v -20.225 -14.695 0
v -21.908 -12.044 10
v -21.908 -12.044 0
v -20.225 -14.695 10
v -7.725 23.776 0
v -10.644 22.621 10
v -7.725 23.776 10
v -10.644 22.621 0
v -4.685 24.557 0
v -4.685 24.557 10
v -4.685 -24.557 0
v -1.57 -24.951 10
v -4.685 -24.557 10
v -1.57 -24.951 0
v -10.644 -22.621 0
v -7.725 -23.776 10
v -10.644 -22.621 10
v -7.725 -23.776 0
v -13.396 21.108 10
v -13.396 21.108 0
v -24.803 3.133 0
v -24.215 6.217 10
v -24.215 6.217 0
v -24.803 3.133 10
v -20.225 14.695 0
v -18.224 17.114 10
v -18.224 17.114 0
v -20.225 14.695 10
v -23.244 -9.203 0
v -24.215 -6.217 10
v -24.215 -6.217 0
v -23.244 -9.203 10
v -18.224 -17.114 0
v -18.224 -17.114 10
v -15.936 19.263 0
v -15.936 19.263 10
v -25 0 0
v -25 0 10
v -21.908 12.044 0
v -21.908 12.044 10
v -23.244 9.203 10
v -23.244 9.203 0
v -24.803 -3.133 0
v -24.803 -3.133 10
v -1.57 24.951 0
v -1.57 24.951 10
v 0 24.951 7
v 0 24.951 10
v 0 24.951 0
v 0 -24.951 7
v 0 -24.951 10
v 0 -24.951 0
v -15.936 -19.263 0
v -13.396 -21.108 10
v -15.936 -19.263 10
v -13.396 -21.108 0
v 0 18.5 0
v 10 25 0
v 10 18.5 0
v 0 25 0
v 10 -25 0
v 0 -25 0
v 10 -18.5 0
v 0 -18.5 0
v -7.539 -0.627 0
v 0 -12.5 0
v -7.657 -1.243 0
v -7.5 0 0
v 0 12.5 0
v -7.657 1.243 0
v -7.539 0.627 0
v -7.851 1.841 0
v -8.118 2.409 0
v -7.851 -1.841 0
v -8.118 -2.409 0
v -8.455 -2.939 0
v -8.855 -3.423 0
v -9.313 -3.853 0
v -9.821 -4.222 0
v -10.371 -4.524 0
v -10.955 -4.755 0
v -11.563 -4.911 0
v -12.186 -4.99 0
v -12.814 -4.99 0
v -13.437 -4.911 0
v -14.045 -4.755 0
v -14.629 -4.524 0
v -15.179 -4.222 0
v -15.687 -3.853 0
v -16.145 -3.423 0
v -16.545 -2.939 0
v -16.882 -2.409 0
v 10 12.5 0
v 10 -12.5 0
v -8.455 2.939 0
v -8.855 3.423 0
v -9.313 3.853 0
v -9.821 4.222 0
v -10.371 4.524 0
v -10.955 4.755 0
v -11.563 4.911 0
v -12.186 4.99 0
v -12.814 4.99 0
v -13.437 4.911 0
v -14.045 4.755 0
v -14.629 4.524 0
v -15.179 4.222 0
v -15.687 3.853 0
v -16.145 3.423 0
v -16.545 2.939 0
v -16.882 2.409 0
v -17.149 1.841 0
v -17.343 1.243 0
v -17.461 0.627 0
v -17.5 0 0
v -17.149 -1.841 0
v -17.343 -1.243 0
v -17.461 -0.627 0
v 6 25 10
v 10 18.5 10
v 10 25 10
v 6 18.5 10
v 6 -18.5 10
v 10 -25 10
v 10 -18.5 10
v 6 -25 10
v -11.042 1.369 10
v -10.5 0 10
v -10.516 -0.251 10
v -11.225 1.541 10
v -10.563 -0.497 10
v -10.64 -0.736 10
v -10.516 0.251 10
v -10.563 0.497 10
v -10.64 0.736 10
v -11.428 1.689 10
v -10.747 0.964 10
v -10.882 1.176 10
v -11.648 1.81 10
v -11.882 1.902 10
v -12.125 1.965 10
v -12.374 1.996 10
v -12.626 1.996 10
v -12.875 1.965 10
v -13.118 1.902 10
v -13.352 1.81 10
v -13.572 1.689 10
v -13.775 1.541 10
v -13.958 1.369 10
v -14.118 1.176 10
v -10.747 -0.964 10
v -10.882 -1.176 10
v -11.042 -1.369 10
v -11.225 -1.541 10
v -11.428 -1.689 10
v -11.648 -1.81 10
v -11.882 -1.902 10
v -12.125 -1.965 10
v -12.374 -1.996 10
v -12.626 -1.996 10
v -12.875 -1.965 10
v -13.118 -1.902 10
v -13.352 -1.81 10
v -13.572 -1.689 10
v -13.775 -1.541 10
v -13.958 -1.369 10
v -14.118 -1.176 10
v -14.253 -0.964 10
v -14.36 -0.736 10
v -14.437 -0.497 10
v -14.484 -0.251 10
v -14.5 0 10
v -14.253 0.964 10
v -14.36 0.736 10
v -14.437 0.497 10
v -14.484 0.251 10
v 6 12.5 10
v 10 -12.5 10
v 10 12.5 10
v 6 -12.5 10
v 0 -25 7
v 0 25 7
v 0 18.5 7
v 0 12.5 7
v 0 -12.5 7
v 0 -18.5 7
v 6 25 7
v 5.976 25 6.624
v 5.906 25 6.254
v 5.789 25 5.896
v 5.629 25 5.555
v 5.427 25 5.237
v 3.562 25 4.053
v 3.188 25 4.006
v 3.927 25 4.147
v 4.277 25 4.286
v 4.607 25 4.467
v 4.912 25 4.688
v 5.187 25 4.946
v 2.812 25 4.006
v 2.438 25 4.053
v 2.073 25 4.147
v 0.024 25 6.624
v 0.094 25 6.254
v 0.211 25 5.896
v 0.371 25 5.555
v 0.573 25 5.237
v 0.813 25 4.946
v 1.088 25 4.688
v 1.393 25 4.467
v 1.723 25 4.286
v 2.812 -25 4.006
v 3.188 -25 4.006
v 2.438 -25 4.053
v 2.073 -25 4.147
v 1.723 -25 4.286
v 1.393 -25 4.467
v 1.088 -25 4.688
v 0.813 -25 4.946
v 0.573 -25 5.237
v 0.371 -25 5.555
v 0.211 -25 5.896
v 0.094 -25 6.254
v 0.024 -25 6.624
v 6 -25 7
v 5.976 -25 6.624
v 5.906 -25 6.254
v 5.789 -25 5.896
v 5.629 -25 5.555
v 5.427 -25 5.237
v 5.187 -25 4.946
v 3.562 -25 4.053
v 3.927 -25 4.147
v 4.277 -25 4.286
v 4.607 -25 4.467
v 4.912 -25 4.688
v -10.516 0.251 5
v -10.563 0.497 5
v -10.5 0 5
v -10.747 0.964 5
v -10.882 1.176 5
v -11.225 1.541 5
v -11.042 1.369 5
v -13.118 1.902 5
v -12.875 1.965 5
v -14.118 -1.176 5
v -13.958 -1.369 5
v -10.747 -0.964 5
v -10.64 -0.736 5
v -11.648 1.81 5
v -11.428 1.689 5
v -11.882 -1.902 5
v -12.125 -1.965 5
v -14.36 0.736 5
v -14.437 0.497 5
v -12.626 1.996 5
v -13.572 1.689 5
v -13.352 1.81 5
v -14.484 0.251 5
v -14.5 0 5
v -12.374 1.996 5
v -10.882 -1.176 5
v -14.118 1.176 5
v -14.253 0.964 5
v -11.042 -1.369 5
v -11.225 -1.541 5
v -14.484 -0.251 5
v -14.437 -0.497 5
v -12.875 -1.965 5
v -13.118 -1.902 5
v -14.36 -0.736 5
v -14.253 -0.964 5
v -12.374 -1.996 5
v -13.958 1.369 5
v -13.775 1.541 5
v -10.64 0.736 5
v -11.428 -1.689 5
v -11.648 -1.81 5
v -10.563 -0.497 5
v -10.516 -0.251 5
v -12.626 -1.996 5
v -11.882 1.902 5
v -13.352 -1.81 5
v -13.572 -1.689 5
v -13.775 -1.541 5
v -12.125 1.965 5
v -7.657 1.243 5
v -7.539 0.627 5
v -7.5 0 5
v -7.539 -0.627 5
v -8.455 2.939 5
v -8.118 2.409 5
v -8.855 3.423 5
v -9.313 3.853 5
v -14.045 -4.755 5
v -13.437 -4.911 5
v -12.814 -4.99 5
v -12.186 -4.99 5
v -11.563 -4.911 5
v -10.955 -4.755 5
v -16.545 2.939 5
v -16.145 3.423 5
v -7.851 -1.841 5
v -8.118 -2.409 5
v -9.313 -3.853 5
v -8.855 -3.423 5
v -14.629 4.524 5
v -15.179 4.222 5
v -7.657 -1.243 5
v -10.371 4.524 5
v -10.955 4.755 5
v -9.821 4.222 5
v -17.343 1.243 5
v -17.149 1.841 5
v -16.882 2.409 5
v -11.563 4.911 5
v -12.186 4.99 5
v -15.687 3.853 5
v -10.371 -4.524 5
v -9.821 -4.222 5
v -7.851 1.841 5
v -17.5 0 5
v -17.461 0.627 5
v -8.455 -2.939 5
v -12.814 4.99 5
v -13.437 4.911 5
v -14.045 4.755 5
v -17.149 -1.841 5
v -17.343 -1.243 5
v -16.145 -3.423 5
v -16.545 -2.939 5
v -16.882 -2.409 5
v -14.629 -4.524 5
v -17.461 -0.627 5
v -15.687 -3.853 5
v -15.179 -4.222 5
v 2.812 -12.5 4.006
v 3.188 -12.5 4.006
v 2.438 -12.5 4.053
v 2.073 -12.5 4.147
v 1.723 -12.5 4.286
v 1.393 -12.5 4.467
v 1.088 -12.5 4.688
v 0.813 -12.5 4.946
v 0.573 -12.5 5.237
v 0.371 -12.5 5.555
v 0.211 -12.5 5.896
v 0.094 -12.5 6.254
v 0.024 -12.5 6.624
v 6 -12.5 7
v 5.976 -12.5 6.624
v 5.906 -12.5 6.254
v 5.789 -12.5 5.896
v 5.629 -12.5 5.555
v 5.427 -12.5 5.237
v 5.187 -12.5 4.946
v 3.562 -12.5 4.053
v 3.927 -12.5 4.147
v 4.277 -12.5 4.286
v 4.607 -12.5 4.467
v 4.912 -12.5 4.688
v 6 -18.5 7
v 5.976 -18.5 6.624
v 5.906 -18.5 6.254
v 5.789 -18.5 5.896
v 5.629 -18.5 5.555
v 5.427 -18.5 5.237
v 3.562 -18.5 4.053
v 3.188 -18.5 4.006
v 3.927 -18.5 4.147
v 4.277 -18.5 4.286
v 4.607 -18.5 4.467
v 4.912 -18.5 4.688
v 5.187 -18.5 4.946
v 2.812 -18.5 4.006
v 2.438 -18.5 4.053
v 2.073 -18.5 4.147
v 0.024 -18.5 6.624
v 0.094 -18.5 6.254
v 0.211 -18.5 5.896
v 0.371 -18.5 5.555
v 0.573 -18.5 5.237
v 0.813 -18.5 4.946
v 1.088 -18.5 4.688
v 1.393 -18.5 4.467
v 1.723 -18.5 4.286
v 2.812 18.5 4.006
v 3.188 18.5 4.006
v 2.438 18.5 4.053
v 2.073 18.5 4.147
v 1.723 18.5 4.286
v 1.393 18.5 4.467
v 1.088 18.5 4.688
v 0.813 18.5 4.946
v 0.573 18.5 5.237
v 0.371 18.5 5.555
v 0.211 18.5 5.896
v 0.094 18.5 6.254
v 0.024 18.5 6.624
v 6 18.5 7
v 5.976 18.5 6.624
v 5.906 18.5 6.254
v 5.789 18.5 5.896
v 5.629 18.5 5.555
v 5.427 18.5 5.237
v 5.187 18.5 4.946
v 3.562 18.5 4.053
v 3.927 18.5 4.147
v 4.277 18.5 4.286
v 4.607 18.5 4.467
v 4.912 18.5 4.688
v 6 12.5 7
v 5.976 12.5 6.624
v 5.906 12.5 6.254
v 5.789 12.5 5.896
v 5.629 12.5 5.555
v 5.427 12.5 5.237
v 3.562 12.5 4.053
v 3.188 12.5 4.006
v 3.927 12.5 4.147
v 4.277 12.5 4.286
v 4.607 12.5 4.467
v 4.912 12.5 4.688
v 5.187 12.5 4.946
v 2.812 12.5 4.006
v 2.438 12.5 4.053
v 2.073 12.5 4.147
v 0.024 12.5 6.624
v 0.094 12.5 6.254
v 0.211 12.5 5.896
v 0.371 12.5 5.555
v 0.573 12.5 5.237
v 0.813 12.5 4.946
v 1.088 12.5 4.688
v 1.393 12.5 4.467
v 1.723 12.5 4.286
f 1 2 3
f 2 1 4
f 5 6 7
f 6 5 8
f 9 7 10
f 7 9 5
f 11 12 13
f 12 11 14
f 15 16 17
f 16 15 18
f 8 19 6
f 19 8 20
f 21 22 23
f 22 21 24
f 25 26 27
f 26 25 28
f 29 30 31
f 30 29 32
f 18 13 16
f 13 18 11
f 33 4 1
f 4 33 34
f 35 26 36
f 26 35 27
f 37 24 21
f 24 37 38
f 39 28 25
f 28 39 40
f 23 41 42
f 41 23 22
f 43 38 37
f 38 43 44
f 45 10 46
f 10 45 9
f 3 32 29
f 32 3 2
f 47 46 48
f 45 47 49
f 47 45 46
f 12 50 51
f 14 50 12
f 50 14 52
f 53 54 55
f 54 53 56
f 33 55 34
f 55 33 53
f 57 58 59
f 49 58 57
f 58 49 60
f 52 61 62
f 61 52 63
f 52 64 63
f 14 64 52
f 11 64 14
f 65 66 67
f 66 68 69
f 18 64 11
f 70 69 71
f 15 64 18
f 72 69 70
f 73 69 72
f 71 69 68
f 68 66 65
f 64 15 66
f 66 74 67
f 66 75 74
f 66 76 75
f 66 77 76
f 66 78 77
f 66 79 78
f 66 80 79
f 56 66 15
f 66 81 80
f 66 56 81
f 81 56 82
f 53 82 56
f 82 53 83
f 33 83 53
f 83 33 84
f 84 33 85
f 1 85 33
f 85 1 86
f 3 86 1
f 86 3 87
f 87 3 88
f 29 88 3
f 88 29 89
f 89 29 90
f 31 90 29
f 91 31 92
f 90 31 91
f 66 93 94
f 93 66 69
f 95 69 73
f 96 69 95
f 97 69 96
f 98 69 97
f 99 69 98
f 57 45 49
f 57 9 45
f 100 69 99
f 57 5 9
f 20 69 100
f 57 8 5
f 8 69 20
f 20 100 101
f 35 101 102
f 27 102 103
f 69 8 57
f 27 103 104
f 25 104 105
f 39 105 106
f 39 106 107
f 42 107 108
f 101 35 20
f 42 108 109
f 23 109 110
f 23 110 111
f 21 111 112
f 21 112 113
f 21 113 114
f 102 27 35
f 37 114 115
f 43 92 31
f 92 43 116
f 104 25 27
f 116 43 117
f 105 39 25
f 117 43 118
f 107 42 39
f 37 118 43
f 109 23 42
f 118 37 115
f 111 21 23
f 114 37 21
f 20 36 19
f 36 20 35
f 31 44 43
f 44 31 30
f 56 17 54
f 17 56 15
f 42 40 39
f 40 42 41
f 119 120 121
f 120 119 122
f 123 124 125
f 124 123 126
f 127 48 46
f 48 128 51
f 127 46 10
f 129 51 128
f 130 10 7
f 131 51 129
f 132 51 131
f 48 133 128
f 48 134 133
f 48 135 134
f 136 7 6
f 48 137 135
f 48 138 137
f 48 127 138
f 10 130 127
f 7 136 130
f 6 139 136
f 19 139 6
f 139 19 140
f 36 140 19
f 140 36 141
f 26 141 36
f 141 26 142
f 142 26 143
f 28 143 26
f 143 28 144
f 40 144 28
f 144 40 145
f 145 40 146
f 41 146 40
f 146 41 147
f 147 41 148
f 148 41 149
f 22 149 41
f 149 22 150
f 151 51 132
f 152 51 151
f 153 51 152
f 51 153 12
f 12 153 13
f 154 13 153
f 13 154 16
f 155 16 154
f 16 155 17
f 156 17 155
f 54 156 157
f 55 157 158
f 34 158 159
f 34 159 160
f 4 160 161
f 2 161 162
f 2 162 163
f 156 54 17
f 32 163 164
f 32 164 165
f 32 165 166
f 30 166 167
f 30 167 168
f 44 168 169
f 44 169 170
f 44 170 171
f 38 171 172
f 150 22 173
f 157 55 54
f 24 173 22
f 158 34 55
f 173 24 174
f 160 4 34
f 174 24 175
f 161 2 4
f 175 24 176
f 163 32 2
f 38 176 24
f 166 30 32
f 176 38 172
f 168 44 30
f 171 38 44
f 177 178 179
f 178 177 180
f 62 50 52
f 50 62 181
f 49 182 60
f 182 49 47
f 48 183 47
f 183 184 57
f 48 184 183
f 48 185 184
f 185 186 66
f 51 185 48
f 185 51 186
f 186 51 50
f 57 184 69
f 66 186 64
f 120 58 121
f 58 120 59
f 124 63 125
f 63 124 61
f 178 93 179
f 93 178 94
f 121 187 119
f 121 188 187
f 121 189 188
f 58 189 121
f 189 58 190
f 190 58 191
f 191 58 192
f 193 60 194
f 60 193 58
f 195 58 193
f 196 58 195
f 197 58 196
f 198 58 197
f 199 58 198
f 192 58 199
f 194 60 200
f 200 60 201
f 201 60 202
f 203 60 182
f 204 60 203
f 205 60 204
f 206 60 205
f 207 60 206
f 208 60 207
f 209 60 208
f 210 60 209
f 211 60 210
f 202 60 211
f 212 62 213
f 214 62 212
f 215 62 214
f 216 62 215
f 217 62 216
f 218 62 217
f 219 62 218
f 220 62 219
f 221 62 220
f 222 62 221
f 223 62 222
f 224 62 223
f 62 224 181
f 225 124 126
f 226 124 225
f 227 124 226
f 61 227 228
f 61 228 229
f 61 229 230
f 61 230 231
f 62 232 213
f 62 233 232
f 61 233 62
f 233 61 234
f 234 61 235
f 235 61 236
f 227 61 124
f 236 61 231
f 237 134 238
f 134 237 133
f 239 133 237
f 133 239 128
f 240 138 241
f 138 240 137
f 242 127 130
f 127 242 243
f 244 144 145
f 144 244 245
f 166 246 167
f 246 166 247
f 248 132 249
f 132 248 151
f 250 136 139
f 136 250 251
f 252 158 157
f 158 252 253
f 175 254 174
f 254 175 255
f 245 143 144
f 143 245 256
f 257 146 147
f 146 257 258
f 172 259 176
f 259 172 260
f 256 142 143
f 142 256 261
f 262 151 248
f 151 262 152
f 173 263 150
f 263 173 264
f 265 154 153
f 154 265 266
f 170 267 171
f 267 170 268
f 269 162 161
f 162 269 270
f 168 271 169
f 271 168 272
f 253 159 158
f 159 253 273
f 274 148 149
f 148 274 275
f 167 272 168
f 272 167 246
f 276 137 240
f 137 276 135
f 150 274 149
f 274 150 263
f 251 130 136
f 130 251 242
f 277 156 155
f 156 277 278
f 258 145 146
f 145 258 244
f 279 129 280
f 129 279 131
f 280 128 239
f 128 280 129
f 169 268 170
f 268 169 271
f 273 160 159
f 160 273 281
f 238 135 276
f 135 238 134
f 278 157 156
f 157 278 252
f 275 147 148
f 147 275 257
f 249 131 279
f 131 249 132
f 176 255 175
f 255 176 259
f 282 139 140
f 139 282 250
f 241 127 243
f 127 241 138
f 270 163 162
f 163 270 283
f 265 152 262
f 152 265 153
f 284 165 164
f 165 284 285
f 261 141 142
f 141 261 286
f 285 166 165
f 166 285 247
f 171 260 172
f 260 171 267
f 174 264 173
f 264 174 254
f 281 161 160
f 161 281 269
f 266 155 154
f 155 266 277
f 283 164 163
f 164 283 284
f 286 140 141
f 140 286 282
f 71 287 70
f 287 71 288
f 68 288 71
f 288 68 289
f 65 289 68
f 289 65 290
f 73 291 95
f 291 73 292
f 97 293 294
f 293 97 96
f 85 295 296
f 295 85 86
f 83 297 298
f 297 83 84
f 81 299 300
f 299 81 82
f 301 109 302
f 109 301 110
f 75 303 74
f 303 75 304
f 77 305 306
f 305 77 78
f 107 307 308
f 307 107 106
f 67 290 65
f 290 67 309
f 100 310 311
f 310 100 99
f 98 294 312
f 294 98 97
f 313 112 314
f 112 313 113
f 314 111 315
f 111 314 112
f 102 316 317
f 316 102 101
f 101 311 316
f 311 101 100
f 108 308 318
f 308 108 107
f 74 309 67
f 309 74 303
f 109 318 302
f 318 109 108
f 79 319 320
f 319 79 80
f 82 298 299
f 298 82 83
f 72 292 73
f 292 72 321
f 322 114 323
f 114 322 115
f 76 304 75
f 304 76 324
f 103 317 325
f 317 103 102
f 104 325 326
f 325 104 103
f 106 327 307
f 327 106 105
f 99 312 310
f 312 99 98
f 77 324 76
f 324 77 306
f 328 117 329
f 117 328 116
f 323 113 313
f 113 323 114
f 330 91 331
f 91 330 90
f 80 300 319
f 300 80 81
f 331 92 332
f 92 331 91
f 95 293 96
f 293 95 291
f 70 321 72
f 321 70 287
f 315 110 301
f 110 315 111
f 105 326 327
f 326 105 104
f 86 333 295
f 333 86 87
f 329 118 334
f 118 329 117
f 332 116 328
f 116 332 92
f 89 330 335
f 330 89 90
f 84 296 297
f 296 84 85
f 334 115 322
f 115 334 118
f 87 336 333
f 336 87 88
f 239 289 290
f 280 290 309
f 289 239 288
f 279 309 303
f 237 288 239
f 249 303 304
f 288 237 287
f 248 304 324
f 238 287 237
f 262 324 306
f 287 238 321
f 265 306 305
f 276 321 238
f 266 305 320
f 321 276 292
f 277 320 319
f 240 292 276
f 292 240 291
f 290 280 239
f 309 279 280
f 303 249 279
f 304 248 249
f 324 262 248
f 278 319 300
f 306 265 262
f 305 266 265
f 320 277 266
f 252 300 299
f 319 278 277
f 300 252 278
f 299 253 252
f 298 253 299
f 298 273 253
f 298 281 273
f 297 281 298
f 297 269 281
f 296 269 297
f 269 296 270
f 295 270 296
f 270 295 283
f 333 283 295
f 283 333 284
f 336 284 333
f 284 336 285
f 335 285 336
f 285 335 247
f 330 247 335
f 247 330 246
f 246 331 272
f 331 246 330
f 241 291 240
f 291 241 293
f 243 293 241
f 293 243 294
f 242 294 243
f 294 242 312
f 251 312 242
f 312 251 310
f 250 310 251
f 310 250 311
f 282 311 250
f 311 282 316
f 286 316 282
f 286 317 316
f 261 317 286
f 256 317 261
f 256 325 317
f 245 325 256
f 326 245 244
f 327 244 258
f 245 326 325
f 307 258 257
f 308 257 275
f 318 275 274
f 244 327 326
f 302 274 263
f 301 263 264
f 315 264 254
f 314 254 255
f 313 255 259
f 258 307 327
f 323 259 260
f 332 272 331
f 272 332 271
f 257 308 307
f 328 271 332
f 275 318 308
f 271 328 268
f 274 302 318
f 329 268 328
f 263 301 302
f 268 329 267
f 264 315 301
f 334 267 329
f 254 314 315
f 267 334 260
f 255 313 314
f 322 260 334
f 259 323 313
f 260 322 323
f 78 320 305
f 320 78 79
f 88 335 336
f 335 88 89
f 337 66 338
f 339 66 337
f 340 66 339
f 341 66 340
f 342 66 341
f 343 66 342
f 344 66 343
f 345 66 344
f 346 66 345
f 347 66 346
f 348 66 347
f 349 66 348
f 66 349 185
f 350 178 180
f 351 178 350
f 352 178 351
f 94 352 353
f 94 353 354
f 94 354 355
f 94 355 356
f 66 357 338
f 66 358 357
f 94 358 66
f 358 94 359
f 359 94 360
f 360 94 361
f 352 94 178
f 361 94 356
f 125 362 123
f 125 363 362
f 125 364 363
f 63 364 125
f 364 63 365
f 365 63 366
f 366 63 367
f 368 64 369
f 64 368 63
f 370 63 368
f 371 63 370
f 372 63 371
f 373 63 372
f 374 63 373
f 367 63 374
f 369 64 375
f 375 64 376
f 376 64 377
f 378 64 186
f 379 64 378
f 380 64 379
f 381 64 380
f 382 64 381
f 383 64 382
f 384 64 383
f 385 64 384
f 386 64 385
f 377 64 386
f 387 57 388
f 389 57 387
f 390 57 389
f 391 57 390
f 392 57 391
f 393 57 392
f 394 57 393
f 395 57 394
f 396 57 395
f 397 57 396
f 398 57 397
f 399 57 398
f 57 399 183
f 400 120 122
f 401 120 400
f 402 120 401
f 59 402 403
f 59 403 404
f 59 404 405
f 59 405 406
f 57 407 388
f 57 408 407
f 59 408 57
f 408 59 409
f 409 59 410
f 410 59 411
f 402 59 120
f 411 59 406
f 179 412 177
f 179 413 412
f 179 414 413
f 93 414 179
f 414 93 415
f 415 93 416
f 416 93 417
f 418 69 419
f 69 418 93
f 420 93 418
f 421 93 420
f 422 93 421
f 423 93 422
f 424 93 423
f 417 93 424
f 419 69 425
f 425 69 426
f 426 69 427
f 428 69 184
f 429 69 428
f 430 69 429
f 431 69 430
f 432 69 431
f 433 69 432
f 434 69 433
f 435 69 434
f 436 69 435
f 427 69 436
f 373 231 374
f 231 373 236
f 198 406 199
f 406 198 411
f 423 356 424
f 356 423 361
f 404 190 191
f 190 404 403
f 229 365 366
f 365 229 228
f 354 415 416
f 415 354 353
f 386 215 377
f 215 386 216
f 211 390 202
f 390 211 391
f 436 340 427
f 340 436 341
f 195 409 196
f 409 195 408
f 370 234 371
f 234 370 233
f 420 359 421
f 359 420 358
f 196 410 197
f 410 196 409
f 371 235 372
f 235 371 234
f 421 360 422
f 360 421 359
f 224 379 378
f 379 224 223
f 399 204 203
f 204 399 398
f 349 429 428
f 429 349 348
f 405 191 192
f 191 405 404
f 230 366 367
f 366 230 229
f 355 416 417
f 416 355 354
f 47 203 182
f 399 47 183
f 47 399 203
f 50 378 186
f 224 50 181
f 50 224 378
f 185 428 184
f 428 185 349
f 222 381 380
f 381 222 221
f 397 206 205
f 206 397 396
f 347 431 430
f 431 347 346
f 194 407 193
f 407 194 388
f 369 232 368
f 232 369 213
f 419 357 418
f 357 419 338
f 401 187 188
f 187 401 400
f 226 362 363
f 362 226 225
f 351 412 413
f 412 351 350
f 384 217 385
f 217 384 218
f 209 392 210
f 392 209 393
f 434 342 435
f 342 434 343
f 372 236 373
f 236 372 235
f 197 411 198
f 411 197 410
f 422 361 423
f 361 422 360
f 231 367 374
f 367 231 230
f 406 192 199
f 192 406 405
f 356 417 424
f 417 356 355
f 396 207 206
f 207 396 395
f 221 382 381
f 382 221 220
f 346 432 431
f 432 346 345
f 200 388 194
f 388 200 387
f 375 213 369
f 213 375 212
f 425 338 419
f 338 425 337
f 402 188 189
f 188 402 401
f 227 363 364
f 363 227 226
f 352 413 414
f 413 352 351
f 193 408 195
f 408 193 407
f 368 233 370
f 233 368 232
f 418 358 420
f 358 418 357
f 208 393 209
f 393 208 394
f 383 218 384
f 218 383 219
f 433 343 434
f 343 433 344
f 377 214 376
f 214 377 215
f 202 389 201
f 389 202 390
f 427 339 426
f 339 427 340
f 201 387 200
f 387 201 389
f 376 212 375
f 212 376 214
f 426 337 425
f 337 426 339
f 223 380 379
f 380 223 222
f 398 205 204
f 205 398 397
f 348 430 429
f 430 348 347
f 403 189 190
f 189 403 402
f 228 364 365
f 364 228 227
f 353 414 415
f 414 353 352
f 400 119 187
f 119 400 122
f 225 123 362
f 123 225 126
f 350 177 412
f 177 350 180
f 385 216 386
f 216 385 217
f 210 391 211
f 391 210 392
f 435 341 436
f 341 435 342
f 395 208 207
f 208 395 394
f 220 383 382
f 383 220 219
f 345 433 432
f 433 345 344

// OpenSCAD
WIDTH = 10;
HEIGHT = 10;
LENGTH = 50;

SLOT_WIDTH = 6;
SLOT_SPACING = 31;

MOUNTING_HOLE_DIA = 4;
MOUNTING_HOLE_HEAD_DIA = 10;
MOUNTING_HOLE_HEAD_HEIGHT = 5;

$fn = 50;

difference() {
    union() {
        intersection() {
            cylinder(d = LENGTH, h = HEIGHT);
            translate([-LENGTH, -LENGTH/2, 0])
            cube(size = [LENGTH, LENGTH, HEIGHT]);
        }
        translate([0, -LENGTH/2, 0])
        cube(size = [WIDTH, LENGTH, HEIGHT]);
    }

    translate([-LENGTH/4, 0, 0]) {
        cylinder(d = MOUNTING_HOLE_DIA, h = HEIGHT);
        cylinder(d = MOUNTING_HOLE_HEAD_DIA, h = MOUNTING_HOLE_HEAD_HEIGHT);
    }

    for(i = [-1, 1]) {
        translate([WIDTH/2, i * SLOT_SPACING/2, 0])
        cube(size = [WIDTH, SLOT_WIDTH, HEIGHT*2], center = true);
    }

    translate([SLOT_WIDTH/2, LENGTH/2, HEIGHT-SLOT_WIDTH/2])
    rotate([90, 0, 0])
    hull() {
        cylinder(d = SLOT_WIDTH, h = LENGTH);
        translate([0, SLOT_WIDTH, 0])
        cylinder(d = SLOT_WIDTH, h = LENGTH);
    }
}
